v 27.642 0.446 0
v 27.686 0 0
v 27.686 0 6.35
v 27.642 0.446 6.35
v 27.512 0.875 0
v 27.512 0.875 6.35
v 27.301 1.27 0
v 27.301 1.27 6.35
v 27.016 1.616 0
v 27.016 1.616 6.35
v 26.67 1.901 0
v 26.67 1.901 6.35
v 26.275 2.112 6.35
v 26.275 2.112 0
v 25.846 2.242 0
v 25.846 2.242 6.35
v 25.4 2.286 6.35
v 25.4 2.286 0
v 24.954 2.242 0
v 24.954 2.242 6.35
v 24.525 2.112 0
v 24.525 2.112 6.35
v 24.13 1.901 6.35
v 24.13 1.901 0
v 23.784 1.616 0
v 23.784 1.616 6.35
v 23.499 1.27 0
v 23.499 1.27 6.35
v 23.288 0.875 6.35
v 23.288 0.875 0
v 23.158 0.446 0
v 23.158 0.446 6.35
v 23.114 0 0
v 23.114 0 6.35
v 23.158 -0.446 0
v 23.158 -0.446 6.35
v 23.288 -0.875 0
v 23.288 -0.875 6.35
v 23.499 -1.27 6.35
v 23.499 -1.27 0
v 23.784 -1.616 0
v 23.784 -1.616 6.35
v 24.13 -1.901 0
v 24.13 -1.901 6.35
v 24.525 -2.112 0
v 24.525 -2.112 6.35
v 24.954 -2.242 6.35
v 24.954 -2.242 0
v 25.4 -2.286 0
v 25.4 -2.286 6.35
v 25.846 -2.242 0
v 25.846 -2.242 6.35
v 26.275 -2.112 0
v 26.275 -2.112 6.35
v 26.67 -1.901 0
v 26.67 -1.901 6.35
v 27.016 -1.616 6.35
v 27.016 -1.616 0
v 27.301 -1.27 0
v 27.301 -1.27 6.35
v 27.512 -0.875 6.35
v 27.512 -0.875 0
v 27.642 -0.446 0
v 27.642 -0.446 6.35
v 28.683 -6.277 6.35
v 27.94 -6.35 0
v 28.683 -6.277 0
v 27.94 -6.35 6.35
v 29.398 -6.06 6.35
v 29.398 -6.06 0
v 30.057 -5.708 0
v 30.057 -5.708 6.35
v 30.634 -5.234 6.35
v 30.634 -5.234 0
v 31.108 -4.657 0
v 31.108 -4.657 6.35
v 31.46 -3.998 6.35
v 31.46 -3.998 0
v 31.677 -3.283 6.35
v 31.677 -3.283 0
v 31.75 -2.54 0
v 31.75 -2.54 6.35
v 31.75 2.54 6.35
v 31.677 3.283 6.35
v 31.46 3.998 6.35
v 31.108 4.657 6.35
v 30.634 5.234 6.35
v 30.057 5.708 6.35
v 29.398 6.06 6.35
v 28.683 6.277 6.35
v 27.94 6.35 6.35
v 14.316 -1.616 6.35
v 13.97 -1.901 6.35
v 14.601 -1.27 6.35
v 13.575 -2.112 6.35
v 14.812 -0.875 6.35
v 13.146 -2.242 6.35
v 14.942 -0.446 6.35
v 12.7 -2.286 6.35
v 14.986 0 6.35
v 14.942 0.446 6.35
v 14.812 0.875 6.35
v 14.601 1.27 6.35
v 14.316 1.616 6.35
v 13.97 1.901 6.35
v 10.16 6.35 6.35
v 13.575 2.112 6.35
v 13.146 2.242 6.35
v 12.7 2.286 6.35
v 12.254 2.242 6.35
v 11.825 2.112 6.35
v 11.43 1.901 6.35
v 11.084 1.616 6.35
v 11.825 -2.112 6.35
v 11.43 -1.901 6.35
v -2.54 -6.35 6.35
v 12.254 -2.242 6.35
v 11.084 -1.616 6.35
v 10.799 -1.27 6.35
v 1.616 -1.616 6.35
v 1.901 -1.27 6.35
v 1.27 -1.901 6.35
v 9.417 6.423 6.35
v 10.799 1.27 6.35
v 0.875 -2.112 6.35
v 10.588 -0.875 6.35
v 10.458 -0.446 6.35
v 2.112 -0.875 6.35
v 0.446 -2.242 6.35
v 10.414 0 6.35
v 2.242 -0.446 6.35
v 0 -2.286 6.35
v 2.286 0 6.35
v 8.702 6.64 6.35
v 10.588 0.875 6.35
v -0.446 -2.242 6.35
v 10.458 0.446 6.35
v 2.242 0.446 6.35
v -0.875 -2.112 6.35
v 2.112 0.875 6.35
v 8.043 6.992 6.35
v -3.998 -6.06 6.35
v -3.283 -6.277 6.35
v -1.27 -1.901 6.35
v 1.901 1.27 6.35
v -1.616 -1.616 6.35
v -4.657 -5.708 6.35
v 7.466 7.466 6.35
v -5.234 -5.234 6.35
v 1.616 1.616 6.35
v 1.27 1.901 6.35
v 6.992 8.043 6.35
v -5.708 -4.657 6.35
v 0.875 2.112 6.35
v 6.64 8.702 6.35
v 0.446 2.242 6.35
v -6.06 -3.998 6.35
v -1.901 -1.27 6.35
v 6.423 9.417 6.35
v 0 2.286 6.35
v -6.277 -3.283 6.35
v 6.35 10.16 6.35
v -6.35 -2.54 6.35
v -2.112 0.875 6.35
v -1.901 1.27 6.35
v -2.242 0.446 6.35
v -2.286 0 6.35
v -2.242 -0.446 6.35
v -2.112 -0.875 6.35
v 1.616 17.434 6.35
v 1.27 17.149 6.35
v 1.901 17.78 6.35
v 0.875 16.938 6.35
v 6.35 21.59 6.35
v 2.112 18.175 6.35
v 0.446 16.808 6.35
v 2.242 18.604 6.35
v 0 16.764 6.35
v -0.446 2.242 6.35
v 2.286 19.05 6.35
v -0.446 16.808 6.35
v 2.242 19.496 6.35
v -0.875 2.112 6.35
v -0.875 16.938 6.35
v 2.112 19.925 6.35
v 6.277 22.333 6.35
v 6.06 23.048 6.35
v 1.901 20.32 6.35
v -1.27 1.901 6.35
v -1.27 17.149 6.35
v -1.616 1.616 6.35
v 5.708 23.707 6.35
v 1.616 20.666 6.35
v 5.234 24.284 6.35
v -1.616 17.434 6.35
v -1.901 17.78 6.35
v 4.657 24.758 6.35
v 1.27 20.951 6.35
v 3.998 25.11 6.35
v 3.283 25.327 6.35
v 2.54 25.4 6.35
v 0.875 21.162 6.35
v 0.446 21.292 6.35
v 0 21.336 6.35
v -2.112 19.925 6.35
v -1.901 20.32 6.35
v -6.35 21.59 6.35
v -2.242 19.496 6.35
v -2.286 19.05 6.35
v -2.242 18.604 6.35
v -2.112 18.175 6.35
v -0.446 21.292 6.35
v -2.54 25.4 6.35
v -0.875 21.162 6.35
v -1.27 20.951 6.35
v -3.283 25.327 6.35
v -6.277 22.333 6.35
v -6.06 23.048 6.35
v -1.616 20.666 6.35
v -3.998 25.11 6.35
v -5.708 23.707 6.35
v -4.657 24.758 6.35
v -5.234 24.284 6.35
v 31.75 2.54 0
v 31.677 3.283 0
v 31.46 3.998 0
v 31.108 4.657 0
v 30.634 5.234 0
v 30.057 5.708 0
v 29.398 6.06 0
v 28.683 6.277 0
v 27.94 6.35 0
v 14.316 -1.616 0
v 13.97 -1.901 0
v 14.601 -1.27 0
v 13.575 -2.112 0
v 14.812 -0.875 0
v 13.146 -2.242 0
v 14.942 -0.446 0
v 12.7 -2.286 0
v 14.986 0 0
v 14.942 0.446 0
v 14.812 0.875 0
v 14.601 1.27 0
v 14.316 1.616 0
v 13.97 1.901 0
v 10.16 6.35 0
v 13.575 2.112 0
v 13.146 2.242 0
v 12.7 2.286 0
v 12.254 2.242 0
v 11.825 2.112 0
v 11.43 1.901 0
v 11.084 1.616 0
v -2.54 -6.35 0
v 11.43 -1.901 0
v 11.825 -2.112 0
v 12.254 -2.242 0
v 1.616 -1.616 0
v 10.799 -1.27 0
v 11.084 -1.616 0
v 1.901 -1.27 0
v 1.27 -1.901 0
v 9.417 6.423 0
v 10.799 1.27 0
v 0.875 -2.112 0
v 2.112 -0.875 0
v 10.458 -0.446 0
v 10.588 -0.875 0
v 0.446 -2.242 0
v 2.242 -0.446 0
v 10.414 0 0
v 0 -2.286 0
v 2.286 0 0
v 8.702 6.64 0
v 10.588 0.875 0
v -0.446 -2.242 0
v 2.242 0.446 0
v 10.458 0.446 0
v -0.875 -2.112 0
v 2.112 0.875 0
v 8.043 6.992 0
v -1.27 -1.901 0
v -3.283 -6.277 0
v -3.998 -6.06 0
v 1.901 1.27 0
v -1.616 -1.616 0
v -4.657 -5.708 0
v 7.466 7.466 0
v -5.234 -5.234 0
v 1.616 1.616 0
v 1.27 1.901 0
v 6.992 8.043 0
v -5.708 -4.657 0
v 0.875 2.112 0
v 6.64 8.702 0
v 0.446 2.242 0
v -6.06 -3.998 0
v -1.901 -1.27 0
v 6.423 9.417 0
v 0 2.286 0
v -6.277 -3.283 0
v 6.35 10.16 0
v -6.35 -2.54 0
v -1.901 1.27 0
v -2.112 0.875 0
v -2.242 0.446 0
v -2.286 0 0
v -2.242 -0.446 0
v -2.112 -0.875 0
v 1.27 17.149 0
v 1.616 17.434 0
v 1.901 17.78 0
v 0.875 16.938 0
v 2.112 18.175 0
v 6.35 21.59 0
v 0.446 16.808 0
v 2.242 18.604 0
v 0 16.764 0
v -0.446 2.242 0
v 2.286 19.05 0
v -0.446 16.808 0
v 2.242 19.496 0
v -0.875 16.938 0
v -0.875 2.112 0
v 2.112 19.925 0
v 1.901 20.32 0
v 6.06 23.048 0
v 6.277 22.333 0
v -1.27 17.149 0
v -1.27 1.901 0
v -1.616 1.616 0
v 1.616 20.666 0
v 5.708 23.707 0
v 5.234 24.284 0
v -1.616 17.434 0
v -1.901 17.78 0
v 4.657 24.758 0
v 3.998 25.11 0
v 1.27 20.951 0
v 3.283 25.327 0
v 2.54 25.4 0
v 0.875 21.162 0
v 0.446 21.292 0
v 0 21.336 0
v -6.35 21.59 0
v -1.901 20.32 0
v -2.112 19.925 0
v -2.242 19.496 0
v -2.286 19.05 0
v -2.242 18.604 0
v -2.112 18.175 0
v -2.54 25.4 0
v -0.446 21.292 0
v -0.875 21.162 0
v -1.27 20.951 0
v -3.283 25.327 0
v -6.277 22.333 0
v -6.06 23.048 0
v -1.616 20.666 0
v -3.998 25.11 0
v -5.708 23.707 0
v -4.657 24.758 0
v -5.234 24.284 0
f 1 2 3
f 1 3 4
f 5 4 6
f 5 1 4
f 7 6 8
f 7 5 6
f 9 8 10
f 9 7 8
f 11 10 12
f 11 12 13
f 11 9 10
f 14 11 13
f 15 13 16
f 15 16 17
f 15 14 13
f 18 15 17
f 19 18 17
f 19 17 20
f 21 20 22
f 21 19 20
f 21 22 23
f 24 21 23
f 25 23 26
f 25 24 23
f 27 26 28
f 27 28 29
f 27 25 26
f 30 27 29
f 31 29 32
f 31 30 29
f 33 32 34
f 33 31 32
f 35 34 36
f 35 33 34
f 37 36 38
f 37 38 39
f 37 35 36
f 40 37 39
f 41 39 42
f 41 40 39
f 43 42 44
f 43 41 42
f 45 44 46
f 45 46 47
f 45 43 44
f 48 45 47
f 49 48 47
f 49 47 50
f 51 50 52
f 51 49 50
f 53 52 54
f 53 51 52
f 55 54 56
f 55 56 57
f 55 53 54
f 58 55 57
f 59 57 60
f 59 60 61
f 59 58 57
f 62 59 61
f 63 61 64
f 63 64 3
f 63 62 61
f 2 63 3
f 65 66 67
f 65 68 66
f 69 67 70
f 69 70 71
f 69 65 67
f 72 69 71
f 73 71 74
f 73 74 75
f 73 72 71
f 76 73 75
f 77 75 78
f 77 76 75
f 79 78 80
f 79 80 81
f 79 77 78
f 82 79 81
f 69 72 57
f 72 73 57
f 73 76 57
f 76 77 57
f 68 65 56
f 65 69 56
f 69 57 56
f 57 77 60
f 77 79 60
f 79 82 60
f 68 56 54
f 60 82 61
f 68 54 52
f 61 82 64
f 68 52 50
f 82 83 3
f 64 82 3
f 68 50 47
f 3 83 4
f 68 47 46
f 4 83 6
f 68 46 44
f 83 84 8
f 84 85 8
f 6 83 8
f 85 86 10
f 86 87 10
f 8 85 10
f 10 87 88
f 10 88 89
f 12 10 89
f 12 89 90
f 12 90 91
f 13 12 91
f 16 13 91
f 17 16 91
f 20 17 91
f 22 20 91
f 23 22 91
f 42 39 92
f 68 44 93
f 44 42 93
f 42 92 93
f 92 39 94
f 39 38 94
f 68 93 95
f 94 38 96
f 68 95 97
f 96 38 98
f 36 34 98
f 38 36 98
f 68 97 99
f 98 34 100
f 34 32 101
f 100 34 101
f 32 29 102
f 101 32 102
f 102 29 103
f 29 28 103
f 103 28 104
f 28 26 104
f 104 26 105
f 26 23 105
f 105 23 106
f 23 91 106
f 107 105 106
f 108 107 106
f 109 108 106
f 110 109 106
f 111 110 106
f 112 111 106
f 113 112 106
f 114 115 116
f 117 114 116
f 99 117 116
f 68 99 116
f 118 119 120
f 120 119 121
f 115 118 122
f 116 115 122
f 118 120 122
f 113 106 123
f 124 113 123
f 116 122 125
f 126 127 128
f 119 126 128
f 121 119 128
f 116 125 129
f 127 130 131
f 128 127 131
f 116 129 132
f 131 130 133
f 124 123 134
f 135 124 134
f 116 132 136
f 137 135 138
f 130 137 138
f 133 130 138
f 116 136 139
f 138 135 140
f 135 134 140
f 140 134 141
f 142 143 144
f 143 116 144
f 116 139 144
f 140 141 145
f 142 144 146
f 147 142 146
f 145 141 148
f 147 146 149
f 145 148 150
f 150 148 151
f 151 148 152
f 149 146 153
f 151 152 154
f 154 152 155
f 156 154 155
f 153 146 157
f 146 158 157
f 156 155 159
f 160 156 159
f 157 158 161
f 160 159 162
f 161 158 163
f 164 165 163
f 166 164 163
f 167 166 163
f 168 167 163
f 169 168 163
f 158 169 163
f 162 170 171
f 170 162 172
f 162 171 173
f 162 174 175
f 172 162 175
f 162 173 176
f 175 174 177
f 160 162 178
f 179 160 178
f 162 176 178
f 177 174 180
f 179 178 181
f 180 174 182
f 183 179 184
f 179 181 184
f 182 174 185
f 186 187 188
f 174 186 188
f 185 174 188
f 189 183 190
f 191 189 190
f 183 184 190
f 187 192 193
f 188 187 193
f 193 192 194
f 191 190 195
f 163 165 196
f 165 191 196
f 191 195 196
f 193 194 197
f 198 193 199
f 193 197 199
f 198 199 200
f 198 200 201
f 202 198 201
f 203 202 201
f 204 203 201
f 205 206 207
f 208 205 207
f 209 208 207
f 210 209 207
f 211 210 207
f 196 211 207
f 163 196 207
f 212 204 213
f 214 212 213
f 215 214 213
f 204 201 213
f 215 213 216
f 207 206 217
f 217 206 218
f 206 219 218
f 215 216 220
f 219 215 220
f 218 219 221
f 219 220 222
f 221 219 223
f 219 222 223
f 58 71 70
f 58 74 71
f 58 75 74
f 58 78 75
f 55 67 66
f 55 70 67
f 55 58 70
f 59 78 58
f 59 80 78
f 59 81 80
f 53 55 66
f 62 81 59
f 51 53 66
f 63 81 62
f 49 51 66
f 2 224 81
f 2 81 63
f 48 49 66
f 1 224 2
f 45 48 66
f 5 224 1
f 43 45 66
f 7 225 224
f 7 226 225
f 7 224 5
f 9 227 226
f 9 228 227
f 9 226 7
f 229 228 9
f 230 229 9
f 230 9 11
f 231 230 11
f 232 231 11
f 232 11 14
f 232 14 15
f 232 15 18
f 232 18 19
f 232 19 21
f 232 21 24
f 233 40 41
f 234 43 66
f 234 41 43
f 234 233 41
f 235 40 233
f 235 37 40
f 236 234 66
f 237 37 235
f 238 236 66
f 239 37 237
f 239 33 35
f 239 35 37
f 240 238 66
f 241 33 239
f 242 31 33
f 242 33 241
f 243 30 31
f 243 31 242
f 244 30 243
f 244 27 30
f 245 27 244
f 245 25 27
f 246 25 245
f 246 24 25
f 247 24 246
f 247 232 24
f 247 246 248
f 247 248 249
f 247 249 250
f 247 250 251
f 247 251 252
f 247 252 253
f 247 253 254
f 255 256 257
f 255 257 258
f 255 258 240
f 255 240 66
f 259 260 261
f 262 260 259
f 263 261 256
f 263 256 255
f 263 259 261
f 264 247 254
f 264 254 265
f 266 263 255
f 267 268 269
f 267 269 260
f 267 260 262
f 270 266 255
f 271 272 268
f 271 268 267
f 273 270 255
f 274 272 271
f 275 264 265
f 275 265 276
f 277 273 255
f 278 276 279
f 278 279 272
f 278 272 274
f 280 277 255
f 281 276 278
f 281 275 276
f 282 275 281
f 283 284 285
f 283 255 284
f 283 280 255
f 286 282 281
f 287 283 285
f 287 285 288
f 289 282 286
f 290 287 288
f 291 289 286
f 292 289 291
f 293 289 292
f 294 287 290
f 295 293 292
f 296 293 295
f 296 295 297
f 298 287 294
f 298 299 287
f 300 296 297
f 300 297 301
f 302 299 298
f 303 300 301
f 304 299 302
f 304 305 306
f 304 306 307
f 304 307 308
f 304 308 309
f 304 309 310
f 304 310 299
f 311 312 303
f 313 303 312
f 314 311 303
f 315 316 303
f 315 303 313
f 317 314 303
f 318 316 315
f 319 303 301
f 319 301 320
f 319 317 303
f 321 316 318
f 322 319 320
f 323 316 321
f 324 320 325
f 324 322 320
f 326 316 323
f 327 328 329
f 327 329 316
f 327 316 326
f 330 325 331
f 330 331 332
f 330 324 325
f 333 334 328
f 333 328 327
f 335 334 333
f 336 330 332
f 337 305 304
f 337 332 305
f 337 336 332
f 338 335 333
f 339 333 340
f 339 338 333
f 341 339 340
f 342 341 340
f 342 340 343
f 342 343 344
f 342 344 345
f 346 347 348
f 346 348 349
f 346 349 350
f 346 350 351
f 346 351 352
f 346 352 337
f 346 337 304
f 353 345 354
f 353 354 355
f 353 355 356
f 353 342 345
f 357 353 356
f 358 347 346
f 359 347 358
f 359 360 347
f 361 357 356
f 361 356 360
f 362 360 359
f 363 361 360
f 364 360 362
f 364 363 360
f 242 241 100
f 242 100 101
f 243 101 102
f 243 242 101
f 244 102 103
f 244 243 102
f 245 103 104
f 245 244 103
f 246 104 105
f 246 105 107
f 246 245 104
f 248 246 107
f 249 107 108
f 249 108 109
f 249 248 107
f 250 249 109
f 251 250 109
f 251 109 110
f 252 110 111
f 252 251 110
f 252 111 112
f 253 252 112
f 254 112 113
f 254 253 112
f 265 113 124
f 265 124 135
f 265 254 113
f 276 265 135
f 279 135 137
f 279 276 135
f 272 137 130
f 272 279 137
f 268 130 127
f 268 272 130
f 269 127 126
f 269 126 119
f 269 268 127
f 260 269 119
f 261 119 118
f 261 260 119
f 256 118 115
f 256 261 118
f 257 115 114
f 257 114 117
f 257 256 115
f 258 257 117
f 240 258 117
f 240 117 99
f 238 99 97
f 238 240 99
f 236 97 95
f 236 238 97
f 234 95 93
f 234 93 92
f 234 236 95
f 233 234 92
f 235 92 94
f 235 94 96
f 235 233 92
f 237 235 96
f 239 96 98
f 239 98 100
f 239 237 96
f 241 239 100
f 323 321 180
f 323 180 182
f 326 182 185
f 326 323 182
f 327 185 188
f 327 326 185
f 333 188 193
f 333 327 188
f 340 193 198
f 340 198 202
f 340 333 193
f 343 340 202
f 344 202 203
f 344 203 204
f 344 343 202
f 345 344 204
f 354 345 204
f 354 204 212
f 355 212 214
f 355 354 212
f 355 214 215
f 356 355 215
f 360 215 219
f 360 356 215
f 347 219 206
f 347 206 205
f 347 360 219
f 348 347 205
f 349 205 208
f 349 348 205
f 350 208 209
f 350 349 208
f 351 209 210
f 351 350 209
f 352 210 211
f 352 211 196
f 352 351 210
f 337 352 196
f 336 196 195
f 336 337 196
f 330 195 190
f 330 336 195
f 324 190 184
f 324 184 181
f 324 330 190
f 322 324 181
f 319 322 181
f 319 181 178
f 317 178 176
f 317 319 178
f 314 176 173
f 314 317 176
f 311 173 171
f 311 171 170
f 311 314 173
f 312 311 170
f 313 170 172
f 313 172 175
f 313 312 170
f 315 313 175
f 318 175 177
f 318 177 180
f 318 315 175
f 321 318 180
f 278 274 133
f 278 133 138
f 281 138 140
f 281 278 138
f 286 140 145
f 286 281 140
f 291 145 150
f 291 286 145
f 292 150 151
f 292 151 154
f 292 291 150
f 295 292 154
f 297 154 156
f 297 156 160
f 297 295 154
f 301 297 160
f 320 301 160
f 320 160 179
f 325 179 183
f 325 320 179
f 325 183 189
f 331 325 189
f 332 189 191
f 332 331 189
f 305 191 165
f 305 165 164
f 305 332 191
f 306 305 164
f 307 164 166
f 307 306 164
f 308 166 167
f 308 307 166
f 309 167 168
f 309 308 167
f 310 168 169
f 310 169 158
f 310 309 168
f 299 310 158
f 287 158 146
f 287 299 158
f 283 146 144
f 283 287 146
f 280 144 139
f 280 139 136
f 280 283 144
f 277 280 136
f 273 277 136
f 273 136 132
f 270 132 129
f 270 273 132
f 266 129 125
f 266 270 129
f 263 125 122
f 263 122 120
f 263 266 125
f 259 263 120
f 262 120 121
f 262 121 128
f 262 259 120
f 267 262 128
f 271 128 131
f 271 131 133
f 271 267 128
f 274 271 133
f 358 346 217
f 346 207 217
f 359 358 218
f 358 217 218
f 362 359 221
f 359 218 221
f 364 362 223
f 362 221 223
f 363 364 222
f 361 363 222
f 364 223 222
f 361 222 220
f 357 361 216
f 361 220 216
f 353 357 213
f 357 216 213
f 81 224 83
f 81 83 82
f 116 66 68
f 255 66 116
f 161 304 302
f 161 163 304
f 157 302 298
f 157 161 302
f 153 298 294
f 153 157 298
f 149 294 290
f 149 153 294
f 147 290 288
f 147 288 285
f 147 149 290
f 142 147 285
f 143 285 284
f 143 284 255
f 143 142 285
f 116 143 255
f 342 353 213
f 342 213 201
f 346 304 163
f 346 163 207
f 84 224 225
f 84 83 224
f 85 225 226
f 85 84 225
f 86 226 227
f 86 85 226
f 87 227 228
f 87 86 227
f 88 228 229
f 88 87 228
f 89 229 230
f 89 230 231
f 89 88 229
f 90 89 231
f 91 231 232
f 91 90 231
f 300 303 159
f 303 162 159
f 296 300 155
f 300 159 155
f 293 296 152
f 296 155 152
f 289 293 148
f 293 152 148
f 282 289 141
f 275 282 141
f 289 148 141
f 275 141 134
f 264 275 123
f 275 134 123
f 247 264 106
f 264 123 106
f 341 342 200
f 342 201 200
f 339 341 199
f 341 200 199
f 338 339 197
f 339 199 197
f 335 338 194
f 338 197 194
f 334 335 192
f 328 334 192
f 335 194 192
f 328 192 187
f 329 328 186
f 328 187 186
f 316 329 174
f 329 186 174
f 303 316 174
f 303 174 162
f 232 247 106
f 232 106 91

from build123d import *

# Parameters (mm, degrees)
SKETCH1_R           = 2.286
BOSS_EXTRUDE1_DEPTH = 6.35
FILLET1_R           = 3.81


with BuildPart() as part:
    # Sketch1 → Boss-Extrude1 (new body)
    with BuildSketch(Plane.XY):
        Polygon((-6.35, -6.35), (-6.35, 25.4), (6.35, 25.4), (6.35, 6.35), (31.75, 6.35), (31.75, -6.35), align=None)
        Circle(SKETCH1_R, mode=Mode.SUBTRACT)
        with Locations((12.7, 0)):
            Circle(SKETCH1_R, mode=Mode.SUBTRACT)
        with Locations((25.4, 0)):
            Circle(SKETCH1_R, mode=Mode.SUBTRACT)
        with Locations((0, 19.05)):
            Circle(SKETCH1_R, mode=Mode.SUBTRACT)
    extrude(amount=BOSS_EXTRUDE1_DEPTH)

    # Fillet1
    fillet1_edges = [part.edges().sort_by_distance(p)[0] for p in [
        (-6.35, -6.35, 3.175),
        (-6.35, 25.4, 3.175),
        (6.35, 25.4, 3.175),
        (6.35, 6.35, 3.175),
        (31.75, 6.35, 3.175),
        (31.75, -6.35, 3.175),
    ]]
    fillet(fillet1_edges, radius=FILLET1_R)


solid = part.part
